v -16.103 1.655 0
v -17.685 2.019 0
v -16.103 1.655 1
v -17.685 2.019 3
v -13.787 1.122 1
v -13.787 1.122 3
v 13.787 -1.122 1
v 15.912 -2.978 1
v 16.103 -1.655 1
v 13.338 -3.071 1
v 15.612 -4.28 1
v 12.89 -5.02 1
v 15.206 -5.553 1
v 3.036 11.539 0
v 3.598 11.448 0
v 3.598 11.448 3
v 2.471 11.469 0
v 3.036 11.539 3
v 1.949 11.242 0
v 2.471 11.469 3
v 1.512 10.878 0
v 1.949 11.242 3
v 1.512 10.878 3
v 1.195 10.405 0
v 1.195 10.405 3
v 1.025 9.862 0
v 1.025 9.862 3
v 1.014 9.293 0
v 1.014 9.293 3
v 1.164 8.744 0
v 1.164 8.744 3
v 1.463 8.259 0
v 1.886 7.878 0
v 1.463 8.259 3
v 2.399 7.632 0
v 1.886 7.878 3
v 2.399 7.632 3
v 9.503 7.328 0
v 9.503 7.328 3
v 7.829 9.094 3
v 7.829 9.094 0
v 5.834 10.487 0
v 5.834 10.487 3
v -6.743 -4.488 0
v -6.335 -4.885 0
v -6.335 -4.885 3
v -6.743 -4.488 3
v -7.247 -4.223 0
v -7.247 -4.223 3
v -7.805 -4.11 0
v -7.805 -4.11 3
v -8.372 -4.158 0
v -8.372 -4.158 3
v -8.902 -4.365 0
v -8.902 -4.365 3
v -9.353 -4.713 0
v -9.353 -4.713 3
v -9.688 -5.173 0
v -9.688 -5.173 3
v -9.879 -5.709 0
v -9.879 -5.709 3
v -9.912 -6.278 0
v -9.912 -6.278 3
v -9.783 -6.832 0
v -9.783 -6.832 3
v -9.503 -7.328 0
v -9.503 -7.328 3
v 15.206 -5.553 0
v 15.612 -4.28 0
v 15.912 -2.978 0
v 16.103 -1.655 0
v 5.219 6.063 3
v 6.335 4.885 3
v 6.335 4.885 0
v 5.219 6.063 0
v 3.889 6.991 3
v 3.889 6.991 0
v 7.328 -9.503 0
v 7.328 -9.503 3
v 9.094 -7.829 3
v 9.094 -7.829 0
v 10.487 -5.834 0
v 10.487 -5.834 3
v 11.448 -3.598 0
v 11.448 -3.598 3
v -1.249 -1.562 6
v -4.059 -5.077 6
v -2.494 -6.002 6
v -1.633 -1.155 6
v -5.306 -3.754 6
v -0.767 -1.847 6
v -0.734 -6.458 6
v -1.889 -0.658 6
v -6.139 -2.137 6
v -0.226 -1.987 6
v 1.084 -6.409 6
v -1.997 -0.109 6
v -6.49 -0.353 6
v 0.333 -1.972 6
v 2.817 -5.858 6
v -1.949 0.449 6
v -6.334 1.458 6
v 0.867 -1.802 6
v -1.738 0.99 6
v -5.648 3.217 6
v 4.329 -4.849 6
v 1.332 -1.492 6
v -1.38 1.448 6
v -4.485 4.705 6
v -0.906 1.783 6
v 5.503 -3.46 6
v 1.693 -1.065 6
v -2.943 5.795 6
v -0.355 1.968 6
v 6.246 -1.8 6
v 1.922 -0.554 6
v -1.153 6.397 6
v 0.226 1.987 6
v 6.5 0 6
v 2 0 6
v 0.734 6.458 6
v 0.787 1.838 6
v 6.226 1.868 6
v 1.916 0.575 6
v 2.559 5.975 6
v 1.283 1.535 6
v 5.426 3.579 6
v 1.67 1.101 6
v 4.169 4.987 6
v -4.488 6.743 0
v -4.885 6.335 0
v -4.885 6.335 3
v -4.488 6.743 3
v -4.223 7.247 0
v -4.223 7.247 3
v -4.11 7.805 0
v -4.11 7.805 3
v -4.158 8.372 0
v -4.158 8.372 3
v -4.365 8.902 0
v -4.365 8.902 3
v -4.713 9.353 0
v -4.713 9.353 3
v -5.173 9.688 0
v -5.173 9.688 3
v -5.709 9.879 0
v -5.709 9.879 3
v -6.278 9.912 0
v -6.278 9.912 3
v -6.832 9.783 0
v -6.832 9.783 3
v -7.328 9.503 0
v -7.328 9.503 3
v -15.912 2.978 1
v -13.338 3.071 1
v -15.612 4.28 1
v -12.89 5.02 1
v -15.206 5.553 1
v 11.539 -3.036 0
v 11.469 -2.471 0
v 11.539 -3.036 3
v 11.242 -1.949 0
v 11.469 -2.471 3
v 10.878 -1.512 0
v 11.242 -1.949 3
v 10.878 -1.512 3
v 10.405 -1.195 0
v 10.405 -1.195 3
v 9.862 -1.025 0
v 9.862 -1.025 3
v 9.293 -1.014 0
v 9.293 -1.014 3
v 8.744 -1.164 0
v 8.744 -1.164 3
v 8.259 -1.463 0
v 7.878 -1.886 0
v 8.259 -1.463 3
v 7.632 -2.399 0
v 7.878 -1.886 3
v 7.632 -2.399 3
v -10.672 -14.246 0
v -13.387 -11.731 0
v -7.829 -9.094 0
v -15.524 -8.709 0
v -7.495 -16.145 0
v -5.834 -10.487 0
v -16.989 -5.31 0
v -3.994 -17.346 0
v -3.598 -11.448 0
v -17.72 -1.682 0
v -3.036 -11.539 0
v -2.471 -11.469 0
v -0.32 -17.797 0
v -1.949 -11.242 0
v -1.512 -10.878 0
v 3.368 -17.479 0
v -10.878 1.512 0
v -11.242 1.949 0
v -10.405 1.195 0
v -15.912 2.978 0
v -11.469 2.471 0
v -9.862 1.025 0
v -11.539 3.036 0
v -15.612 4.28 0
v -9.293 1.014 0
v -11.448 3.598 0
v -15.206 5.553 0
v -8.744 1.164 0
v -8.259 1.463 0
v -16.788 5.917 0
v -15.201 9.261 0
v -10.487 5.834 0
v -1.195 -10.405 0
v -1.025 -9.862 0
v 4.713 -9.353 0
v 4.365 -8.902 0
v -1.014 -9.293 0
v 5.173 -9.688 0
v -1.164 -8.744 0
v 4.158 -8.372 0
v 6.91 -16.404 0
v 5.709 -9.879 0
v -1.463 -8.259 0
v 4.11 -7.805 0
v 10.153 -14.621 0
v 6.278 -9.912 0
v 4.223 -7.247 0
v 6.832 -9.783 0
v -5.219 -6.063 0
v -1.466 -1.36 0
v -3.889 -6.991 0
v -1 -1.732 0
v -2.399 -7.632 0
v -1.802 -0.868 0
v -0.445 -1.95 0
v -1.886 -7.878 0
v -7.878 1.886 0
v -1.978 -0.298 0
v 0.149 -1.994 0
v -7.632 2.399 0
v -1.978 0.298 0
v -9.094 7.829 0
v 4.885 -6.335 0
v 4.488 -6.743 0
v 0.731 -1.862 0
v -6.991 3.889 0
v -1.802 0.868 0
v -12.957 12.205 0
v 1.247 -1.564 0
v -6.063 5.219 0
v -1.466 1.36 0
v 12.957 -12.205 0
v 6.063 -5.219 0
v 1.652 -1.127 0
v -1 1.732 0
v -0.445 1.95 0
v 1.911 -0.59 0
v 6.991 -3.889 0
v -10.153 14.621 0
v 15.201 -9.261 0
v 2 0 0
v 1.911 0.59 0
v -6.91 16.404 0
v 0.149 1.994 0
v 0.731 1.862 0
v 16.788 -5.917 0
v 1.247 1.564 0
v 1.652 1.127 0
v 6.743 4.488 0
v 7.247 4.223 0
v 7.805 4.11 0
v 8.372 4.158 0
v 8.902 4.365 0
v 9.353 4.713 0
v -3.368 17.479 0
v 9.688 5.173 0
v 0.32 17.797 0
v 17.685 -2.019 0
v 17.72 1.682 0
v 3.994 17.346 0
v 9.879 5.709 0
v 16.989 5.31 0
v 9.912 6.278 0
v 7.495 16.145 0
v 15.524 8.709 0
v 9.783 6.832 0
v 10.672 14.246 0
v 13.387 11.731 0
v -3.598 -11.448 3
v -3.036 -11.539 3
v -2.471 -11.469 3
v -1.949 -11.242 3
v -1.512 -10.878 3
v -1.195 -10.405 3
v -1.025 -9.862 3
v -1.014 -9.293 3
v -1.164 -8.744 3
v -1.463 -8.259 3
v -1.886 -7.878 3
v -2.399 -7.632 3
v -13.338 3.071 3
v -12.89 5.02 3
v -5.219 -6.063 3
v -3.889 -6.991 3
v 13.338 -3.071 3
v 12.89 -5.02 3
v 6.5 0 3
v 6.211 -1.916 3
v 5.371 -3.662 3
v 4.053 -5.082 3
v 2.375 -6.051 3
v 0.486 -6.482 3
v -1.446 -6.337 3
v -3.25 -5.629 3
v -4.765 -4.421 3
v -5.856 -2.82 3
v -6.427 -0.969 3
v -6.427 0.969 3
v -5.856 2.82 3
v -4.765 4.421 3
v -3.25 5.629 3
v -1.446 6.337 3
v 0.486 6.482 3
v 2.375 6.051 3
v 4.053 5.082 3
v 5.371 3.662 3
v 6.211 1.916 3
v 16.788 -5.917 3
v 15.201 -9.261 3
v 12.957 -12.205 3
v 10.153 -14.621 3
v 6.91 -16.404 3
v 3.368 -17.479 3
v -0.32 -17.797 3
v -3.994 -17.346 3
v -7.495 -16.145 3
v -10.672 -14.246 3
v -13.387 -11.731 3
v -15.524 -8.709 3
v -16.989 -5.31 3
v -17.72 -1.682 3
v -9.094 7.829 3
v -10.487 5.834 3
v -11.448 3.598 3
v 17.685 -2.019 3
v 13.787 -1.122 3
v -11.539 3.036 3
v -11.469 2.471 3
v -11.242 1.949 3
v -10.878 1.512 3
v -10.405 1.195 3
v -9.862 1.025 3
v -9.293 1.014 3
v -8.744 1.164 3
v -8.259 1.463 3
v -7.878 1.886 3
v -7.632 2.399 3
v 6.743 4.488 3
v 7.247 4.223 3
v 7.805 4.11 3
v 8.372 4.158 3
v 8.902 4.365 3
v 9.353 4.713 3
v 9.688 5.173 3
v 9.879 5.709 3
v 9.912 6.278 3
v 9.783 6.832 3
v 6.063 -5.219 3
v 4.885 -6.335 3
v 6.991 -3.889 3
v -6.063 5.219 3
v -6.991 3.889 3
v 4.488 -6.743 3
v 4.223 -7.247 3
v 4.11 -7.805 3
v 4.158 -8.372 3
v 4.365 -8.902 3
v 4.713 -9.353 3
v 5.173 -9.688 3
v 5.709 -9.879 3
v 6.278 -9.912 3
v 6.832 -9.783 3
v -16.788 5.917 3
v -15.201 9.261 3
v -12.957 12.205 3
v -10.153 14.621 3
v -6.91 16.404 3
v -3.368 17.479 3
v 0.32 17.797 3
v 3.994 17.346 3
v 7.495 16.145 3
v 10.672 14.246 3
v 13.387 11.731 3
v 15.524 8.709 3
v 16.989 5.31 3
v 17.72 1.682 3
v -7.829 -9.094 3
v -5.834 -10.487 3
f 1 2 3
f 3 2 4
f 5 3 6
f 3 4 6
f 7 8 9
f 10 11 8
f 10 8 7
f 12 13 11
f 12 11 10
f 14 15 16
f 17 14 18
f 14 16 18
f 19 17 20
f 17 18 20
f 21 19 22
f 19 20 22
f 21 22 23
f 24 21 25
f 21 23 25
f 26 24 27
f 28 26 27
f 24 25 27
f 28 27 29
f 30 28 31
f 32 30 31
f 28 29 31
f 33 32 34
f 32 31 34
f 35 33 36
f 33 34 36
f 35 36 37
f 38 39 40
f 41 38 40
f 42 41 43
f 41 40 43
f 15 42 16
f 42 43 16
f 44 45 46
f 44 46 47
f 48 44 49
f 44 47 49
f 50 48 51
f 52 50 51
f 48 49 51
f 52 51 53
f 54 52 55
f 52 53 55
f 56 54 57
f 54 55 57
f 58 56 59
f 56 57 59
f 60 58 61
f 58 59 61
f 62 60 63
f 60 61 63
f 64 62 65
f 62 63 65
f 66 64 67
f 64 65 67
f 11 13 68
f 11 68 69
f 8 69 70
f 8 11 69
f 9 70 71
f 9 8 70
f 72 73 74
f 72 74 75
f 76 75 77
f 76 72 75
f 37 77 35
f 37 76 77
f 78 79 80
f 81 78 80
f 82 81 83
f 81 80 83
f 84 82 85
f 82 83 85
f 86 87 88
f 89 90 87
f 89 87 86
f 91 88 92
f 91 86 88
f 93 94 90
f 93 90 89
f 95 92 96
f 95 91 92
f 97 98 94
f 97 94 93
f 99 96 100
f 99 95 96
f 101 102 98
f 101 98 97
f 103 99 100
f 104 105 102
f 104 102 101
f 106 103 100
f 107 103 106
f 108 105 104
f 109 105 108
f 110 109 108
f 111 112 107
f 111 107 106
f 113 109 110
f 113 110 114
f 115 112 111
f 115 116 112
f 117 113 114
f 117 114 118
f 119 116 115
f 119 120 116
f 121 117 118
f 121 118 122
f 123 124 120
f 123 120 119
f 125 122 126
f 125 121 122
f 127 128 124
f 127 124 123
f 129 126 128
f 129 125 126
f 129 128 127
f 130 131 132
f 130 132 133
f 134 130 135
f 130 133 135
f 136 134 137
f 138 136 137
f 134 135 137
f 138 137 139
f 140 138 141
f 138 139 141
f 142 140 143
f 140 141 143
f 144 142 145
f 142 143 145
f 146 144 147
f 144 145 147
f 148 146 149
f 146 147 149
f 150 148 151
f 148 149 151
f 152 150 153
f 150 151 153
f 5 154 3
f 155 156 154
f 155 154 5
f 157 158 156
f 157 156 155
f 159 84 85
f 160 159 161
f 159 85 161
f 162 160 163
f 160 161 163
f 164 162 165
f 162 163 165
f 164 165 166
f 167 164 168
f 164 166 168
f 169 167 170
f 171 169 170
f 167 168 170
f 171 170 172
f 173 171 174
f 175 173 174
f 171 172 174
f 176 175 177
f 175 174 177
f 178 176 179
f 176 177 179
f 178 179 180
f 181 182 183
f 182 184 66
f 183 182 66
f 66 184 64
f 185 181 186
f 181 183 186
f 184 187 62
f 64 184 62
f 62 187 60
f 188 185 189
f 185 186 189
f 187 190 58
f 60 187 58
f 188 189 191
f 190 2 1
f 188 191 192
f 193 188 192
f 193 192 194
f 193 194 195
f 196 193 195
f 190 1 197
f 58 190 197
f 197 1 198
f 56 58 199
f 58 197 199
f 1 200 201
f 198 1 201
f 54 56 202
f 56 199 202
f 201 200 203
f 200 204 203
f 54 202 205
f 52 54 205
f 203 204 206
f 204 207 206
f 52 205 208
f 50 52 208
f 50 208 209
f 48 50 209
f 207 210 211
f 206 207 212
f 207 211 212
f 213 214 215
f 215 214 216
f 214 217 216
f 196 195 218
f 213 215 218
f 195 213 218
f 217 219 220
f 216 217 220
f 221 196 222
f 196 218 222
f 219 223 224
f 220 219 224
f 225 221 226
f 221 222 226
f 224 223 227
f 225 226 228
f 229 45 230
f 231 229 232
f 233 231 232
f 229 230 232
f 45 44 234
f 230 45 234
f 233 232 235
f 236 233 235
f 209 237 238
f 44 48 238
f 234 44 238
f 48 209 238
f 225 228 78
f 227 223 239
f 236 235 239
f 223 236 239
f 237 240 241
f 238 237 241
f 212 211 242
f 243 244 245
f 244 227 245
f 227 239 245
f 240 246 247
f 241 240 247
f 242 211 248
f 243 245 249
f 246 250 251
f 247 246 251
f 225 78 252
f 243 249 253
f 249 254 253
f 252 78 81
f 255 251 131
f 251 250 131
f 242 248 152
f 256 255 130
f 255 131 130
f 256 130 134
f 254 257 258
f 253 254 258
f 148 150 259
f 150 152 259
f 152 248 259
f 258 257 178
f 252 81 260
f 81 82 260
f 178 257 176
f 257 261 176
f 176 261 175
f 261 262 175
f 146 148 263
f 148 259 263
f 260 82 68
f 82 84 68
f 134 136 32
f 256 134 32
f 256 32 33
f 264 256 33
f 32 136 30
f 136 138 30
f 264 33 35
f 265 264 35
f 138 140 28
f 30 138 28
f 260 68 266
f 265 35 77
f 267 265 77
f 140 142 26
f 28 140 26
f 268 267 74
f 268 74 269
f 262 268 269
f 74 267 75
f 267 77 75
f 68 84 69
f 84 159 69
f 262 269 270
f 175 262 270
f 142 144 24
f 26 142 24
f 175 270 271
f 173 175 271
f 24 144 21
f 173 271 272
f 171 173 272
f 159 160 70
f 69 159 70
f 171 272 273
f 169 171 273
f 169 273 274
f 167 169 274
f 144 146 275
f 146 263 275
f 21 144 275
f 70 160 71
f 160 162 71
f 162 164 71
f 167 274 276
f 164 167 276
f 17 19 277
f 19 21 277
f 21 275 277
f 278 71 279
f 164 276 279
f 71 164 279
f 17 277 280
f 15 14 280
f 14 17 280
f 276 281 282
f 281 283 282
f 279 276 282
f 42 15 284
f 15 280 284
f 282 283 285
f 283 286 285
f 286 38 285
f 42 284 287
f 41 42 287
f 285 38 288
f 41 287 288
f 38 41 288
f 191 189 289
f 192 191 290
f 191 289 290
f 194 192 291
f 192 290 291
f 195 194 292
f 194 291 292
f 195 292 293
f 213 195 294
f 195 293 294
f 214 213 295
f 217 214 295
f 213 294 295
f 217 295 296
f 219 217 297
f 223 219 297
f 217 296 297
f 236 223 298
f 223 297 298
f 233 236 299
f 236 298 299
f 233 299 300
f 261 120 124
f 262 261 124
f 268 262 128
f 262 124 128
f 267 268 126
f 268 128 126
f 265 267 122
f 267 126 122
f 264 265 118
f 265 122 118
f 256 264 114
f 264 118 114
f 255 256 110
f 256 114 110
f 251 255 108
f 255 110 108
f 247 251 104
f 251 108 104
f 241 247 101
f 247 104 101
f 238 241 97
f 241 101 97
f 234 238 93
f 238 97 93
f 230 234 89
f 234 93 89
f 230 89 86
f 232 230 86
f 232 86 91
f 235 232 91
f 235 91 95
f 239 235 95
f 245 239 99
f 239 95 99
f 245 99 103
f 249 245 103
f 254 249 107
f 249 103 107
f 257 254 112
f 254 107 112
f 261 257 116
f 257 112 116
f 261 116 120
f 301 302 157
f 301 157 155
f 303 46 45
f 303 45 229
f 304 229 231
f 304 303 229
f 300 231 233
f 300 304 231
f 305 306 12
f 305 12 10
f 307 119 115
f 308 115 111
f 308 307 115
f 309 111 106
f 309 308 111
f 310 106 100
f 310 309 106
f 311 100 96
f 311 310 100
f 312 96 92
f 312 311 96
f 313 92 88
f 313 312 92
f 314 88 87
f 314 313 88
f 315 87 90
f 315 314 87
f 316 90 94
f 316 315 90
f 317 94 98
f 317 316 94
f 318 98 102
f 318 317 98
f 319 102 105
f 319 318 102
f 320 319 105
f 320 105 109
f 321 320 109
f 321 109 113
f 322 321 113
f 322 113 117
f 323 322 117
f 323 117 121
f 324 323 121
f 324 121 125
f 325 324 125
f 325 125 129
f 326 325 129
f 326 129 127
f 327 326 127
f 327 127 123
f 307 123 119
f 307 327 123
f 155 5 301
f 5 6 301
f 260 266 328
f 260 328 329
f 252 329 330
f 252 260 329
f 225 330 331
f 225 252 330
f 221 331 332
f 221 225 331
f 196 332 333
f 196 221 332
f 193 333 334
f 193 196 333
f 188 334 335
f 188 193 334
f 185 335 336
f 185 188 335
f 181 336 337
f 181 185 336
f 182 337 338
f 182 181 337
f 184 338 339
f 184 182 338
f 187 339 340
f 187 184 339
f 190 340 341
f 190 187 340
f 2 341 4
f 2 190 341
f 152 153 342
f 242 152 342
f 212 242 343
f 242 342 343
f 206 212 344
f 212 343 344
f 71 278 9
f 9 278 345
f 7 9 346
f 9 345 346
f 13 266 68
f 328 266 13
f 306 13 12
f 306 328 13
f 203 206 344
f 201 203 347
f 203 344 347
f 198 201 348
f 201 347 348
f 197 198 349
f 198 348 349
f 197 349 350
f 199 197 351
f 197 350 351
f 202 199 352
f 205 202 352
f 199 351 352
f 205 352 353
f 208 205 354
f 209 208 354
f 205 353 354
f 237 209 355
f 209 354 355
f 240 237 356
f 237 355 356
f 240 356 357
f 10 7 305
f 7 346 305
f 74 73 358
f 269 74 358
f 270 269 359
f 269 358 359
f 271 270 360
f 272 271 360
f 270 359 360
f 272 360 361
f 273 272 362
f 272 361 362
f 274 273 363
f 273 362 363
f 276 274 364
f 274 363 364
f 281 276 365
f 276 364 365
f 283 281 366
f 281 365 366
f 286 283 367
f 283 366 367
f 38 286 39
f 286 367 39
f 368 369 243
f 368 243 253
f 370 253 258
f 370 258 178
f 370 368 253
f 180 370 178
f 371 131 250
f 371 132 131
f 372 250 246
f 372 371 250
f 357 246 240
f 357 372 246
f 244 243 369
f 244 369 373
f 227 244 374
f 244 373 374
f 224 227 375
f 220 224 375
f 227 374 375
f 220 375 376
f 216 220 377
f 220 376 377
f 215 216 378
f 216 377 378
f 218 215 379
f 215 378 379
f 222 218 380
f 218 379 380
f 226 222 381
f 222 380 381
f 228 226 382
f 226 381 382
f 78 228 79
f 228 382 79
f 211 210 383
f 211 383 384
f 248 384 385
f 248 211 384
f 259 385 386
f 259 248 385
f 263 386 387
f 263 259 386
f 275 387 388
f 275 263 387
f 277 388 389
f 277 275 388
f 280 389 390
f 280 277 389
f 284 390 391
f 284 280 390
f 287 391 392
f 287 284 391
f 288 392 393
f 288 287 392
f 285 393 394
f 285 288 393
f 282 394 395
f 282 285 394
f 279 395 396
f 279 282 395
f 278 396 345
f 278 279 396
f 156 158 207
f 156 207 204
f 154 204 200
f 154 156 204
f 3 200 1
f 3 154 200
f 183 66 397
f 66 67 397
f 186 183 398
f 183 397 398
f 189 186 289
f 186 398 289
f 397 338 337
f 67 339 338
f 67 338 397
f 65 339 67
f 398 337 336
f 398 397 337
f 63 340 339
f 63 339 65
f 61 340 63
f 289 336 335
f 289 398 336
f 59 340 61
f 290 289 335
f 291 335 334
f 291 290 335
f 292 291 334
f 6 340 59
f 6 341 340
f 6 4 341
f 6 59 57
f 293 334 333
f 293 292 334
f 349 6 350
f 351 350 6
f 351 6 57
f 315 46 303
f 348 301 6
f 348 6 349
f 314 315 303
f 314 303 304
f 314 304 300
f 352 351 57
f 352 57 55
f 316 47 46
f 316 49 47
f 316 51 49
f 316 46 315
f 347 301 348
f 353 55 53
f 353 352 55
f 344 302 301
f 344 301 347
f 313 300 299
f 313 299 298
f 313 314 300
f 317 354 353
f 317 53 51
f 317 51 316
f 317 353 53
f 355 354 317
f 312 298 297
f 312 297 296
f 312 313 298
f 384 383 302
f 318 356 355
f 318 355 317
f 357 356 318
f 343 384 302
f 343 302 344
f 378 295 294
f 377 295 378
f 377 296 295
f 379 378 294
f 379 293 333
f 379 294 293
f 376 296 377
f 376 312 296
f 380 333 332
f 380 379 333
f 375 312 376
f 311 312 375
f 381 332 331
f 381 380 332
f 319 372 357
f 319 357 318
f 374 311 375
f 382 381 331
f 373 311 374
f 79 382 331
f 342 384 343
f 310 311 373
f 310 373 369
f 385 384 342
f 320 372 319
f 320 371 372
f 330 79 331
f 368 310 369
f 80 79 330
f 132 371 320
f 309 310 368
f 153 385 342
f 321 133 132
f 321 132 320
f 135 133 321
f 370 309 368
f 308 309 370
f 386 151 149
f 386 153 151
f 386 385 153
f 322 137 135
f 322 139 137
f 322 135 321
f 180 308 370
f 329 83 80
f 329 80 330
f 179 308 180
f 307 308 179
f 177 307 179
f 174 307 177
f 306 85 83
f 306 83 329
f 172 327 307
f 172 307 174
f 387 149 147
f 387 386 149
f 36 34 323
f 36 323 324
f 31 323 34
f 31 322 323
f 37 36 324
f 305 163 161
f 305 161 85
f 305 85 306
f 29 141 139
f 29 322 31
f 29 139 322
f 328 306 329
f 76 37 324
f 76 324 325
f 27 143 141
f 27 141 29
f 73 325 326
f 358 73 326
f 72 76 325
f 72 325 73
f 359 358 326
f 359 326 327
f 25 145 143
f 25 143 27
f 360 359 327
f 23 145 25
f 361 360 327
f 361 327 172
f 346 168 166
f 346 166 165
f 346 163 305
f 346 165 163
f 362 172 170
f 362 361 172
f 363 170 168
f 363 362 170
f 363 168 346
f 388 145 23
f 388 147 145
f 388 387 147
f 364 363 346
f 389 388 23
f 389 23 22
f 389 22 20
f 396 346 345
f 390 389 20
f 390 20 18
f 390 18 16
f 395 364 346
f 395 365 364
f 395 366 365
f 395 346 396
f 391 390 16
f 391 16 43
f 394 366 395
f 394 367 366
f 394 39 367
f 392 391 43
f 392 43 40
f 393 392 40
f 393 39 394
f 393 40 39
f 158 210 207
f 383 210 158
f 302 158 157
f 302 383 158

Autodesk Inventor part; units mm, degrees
ref_plane "YZ Plane" through (0, 0, 0) normal (1, 0, 0) x (0, 1, 0)
ref_plane "XZ Plane" through (0, 0, 0) normal (0, 1, 0) x (-1, 0, 0)
ref_plane "XY Plane" through (0, 0, 0) normal (0, 0, 1) x (1, 0, 0)
sketch "Sketch2" plane through (0, 0, 0) normal (0, 0, 1) x (1, 0, 0)
  circle A0 centre (0, 0) radius 17.8
  dimension "d0" = 35.6
extrude "Extrusion1" add sketch "Sketch2" along normal blind 3
sketch "Sketch3" plane through (0, 0, 3) normal (0, 0, 1) x (1, 0, 0)
  circle A0 centre (0, 0) radius 6.5
  circle A1 centre (0, 0) radius 2
  arc A2 (-6.1065, 7.919) -> (-9.5399, 2.9985) centre (0, 0) ccw construction
  arc A3 (-7.3277, 9.5029) -> (-11.4478, 3.5982) centre (0, 0) ccw
  arc A4 (-4.8852, 6.3352) -> (-7.6319, 2.3988) centre (0, 0) ccw
  arc A5 (-4.8852, 6.3352) -> (-7.3277, 9.5029) centre (-6.1065, 7.919) ccw
  arc A6 (-11.4478, 3.5982) -> (-7.6319, 2.3988) centre (-9.5399, 2.9985) ccw
  circle A7 centre (0, 0) radius 17.8 projected
  line L0 (0, 0) -> (-13.3383, 3.0709)
  line L1 (-16.7877, 5.9173) -> (-12.8896, 5.0199)
  line L2 (-12.8896, 5.0199) -> (-13.3383, 3.0709)
  line L3 (-17.6851, 2.0193) -> (-13.7871, 1.1219)
  line L4 (-13.7871, 1.1219) -> (-13.3383, 3.0709)
  arc A8 (-16.7877, 5.9173) -> (-17.6851, 2.0193) centre (0, 0) ccw
  arc A9 (-15.2021, 5.563) -> (-16.1032, 1.6551) centre (0, 0) ccw
  line L5 (-16.7877, 5.9173) -> (-15.2057, 5.5531)
  line L6 (-16.1032, 1.6551) -> (-17.6851, 2.0193)
  dimension "d3" = 13
  dimension "d4" = 4
  dimension "d18" = 10
  dimension "d20" = 4
  dimension "d26" = 4
  dimension "d27" = 2
  dimension "d33" = 6
extrude "Extrusion2" add sketch "Sketch3" along normal blind 3 contours A0
extrude "Extrusion3" cut sketch "Sketch3" against normal through all contours A1
extrude "Extrusion5" cut sketch "Sketch3" against normal blind 3 contours A6 L0 | L0 A6 A3 A5 A4
pattern_circular "Circular Pattern1" count 4 over 360 about axis through (0, 0, 3) along (0, 0, 1) of "Extrusion5"
extrude "Extrusion6" cut sketch "Sketch3" against normal blind 2 contours L4 L3 A9 L1 L2 | A9 L3 A7 L1
extrude "Extrusion7" cut sketch "Sketch3" against normal through all contours A9 L3 A7 L1
pattern_circular "Circular Pattern3" count 2 over 360 about axis through (0, 0, 3) along (0, 0, 1) of "Extrusion6", "Extrusion7"
properties part number "MotorFenek"
